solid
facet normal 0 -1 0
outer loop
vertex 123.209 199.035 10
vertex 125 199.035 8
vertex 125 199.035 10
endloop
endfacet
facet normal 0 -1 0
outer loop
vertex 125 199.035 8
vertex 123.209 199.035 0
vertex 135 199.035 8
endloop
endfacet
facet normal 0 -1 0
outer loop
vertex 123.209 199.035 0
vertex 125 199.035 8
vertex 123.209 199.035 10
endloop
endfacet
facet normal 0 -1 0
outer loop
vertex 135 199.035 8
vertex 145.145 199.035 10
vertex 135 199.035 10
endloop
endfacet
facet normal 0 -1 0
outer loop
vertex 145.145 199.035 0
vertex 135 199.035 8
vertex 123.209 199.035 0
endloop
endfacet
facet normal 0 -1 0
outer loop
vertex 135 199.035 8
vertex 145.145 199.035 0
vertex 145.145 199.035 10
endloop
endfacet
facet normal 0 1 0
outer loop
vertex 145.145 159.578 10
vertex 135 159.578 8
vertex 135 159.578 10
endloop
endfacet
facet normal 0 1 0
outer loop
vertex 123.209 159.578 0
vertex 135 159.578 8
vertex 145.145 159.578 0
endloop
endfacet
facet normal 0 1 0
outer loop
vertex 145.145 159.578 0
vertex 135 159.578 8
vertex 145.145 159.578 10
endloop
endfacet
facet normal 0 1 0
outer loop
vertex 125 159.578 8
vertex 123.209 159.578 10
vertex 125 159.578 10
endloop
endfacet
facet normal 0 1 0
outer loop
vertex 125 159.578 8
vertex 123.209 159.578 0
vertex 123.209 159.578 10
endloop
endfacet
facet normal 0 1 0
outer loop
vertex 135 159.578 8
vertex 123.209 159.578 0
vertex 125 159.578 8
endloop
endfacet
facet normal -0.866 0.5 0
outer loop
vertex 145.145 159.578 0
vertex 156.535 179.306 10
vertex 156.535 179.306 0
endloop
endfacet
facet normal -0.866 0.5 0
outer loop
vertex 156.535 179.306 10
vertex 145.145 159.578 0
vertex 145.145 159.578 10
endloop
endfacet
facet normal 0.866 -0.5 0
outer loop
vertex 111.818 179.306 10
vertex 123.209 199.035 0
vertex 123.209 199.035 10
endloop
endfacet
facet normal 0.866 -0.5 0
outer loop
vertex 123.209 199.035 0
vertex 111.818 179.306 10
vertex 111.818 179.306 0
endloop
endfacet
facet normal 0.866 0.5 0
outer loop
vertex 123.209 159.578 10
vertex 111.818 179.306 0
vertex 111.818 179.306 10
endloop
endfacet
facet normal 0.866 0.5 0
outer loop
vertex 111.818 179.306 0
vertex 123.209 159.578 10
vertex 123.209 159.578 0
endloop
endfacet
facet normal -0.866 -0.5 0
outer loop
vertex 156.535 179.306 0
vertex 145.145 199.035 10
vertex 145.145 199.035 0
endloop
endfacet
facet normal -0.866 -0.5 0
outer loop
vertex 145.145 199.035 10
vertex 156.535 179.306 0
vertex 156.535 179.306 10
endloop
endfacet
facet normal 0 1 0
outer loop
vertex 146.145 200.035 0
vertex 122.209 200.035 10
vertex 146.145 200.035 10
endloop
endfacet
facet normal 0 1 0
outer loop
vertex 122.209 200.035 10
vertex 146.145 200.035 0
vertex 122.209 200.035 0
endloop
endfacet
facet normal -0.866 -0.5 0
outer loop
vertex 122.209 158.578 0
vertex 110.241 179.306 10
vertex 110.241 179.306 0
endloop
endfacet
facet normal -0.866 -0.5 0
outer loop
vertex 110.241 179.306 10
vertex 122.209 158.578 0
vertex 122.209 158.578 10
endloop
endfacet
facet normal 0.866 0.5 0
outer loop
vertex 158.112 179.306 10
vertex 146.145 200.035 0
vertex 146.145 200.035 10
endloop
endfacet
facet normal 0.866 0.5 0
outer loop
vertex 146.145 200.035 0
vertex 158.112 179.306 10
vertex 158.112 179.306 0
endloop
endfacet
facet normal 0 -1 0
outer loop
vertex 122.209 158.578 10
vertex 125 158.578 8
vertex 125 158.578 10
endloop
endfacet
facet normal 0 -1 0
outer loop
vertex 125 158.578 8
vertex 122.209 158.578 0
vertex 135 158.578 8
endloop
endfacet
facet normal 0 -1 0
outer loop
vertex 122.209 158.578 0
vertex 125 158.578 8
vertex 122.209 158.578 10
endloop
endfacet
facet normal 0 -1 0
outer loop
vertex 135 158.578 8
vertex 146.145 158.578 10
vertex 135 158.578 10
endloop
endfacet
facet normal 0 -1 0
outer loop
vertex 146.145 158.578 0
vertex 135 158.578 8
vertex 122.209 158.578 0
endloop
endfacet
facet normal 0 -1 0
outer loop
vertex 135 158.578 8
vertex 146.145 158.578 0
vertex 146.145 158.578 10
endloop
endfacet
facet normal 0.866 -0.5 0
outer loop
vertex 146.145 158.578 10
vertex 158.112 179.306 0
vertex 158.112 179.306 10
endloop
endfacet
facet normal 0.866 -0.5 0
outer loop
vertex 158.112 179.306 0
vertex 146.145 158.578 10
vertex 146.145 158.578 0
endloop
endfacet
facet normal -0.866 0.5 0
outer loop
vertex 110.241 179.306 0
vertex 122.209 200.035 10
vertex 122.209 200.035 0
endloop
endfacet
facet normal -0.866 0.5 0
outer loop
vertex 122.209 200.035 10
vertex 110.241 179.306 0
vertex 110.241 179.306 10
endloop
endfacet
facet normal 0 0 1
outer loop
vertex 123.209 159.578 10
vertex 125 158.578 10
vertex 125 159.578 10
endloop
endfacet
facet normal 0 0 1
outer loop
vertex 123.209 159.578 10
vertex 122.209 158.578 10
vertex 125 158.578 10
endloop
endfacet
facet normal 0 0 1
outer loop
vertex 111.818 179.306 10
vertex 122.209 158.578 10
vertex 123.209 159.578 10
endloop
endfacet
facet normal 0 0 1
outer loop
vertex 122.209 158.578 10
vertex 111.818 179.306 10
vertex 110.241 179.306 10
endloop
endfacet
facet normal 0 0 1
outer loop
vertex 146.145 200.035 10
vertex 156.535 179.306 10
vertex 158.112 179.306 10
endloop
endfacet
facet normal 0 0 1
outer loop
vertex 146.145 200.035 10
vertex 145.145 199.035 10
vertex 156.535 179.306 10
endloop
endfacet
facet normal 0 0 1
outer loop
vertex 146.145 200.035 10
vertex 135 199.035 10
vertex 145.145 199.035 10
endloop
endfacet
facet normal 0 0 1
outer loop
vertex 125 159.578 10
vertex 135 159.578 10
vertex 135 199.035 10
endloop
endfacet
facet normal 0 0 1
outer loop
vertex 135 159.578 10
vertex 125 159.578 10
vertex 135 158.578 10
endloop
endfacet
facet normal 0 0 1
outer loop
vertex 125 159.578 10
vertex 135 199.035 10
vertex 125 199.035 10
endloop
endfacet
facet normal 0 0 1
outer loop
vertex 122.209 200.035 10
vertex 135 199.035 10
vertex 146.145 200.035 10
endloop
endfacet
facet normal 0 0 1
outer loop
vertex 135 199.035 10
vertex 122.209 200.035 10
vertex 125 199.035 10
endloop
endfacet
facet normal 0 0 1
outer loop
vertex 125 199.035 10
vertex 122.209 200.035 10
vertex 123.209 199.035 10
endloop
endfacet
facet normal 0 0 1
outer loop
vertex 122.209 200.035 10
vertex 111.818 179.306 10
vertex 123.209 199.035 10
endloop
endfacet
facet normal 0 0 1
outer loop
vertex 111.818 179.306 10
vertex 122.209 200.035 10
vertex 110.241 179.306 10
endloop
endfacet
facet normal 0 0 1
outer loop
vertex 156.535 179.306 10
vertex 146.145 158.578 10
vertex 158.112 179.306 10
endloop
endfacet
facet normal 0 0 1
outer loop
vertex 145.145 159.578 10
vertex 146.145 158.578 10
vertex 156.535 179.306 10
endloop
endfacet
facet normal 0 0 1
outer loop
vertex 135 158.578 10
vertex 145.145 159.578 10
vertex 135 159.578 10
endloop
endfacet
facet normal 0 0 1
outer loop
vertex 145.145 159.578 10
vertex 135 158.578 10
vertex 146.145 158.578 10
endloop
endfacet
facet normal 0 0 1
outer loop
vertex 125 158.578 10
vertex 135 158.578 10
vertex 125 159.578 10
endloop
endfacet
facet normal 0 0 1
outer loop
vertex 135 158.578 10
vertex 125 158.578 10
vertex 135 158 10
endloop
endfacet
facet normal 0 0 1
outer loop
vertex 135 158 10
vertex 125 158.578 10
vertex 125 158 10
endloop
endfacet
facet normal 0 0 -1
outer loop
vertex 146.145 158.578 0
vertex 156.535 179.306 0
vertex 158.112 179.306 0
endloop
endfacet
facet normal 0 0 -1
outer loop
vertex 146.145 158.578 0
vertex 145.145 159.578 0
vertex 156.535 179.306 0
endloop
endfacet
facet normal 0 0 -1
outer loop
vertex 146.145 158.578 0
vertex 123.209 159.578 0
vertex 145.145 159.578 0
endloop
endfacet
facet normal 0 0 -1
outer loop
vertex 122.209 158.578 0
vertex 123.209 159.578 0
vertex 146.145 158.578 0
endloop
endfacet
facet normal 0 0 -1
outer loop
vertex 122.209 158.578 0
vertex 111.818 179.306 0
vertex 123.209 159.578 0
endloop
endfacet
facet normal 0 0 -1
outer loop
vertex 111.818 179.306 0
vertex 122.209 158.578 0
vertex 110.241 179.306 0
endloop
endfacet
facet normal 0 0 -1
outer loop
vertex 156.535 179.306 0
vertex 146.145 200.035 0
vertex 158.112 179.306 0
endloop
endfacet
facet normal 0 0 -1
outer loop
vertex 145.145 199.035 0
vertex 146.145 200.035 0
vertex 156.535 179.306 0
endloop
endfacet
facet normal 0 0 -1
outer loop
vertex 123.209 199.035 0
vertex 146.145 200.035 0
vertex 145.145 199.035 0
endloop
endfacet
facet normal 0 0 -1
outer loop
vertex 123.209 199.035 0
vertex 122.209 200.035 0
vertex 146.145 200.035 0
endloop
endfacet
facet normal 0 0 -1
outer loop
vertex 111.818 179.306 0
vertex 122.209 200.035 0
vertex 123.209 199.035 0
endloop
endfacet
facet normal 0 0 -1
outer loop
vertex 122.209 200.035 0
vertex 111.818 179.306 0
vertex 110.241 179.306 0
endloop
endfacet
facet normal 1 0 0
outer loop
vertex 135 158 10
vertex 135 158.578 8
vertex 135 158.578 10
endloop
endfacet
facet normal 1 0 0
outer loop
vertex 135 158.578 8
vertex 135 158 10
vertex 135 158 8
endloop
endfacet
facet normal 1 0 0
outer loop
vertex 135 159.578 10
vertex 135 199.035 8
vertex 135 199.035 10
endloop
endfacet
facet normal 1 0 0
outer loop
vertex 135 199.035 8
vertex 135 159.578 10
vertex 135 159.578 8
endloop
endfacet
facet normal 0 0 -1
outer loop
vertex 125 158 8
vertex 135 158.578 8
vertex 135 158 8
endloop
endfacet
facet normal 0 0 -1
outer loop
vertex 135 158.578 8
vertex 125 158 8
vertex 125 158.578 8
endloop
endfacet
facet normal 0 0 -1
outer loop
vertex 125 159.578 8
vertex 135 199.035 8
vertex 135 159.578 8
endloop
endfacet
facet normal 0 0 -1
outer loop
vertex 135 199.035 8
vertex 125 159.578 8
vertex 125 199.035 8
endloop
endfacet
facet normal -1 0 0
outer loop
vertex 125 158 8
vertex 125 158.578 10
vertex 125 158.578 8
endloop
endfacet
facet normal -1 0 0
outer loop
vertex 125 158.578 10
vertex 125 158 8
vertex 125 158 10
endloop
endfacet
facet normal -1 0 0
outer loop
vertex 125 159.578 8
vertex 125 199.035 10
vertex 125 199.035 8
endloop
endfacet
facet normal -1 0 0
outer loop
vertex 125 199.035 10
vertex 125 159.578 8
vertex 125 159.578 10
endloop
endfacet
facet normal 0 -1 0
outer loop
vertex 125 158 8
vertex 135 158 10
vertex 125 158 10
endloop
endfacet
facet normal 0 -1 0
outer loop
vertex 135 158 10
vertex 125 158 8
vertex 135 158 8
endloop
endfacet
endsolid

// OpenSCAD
//1inch=25.4mm 
inchfactor = 25.4;
scale=0.96;

module cookie_profile(file,h) {
  linear_extrude(height = h)
    scale([scale,scale,scale])import(file = file,center=true);
    
}
module offset_shell(thickness = 0.5) {
  difference() {
    render() {
      minkowski() {
        children();
        cube([2 * thickness, 2 * thickness, 2 * thickness], center=true);
      }
    }
    translate([0, 0, -5 * thickness]) scale([1, 1, 100])
      children();
  }
}

module moulding(h)
{
    translate([0,100,0]) cube([11*inchfactor,5,h]);
}
/*
difference() {
  children();
  translate([0, 0, -5]) scale([1, 1, 100])
    translate([0, 0, -2])
      invert(0.9 * bbox)
        minkowski() {
          invert() knight_profile();
          cube([1, 1, 1], center=true);
        }
}
*/

module inset_shell(thickness = 0.5, bbox = [5000, 5000, 5000]) {
  module invert(bbox = [5000, 5000, 5000]) {
    difference() {
      cube(bbox, true);
      children();
    }        
  }

  module inset(thickness = 0.5, bbox = [5000, 5000, 5000]) {
    render() {
      invert(0.9 * bbox)
        minkowski() {
          invert() children();
          cube([2 * thickness, 2 * thickness, 2 * thickness], center=true);
        }
    }
  }

  render() {
    difference() {
      children();
      translate([0, 0, -5 * thickness]) scale([1, 1, 100]) translate([0, 0, -2 * thickness])
        inset(thickness, bbox)
          children();
    }
  }
}

if (0)
{
translate([250,100,0]) rotate([0,0,90]) inset_shell(1)
  cookie_profile("dxf/smallturret.dxf",10);
}
if (0)
{
translate([250,50,0]) rotate([0,0,90]) inset_shell(1)
  cookie_profile("dxf/bigturret.dxf",10);
}

// fix this -- weird shape
if (0)
{
translate([0,0,0])inset_shell(1)
  cookie_profile("dxf/frontwall.dxf",10);
  translate([80,42,8])cube([10,225,2]);
  translate([200,42,8])cube([10,150,2]);
  translate([0,135,8])cube([268.2,10,2]);
}
// fix this -- weird shape
if (0)
{
translate([0,0,0])inset_shell(1)
  cookie_profile("dxf/backmiddlewall.dxf",10);
  translate([80,42,8])cube([10,225,2]);
}
if (0)
{
inset_shell(1)
  cookie_profile("dxf/frontwall_lower.dxf",12);
  translate([80,42,8])cube([10,93,2]);
  translate([200,42,8])cube([10,90,2]);
}

if (0)
{
translate([0,0,0])inset_shell(1)
  cookie_profile("dxf/side1.dxf",10);
      translate([70,69,8])cube([10,152,2]);
  translate([170,69,8])cube([10,152,2]);

}
if(0)
{
translate([0,0,0])inset_shell(1)
  cookie_profile("dxf/side2.dxf",10);
          translate([70,69,8])cube([10,152,2]);

}
if (0)
{
translate([0,0,0])inset_shell(1)
  cookie_profile("dxf/side3.dxf",10);
  translate([70,69,8])cube([10,152,2]);
  translate([125,69,8])cube([10,152,2]);

}
if (1)
{
translate([0,0,0])inset_shell(1)
  cookie_profile("dxf/hexspacer.dxf",10);
  //translate([70,69,8])cube([10,152,2]);
  translate([125,158,8])cube([10,42,2]);

}
//translate([0,0,0])inset_shell(1)
 // cookie_profile("dxf/bigside.dxf",10);
//translate([0,0,0])inset_shell(1)
//  cookie_profile("dxf/bigside2.dxf",10);
//translate([0,0,0])inset_shell(1)
//  cookie_profile("dxf/frontwall_lower.dxf",10);
